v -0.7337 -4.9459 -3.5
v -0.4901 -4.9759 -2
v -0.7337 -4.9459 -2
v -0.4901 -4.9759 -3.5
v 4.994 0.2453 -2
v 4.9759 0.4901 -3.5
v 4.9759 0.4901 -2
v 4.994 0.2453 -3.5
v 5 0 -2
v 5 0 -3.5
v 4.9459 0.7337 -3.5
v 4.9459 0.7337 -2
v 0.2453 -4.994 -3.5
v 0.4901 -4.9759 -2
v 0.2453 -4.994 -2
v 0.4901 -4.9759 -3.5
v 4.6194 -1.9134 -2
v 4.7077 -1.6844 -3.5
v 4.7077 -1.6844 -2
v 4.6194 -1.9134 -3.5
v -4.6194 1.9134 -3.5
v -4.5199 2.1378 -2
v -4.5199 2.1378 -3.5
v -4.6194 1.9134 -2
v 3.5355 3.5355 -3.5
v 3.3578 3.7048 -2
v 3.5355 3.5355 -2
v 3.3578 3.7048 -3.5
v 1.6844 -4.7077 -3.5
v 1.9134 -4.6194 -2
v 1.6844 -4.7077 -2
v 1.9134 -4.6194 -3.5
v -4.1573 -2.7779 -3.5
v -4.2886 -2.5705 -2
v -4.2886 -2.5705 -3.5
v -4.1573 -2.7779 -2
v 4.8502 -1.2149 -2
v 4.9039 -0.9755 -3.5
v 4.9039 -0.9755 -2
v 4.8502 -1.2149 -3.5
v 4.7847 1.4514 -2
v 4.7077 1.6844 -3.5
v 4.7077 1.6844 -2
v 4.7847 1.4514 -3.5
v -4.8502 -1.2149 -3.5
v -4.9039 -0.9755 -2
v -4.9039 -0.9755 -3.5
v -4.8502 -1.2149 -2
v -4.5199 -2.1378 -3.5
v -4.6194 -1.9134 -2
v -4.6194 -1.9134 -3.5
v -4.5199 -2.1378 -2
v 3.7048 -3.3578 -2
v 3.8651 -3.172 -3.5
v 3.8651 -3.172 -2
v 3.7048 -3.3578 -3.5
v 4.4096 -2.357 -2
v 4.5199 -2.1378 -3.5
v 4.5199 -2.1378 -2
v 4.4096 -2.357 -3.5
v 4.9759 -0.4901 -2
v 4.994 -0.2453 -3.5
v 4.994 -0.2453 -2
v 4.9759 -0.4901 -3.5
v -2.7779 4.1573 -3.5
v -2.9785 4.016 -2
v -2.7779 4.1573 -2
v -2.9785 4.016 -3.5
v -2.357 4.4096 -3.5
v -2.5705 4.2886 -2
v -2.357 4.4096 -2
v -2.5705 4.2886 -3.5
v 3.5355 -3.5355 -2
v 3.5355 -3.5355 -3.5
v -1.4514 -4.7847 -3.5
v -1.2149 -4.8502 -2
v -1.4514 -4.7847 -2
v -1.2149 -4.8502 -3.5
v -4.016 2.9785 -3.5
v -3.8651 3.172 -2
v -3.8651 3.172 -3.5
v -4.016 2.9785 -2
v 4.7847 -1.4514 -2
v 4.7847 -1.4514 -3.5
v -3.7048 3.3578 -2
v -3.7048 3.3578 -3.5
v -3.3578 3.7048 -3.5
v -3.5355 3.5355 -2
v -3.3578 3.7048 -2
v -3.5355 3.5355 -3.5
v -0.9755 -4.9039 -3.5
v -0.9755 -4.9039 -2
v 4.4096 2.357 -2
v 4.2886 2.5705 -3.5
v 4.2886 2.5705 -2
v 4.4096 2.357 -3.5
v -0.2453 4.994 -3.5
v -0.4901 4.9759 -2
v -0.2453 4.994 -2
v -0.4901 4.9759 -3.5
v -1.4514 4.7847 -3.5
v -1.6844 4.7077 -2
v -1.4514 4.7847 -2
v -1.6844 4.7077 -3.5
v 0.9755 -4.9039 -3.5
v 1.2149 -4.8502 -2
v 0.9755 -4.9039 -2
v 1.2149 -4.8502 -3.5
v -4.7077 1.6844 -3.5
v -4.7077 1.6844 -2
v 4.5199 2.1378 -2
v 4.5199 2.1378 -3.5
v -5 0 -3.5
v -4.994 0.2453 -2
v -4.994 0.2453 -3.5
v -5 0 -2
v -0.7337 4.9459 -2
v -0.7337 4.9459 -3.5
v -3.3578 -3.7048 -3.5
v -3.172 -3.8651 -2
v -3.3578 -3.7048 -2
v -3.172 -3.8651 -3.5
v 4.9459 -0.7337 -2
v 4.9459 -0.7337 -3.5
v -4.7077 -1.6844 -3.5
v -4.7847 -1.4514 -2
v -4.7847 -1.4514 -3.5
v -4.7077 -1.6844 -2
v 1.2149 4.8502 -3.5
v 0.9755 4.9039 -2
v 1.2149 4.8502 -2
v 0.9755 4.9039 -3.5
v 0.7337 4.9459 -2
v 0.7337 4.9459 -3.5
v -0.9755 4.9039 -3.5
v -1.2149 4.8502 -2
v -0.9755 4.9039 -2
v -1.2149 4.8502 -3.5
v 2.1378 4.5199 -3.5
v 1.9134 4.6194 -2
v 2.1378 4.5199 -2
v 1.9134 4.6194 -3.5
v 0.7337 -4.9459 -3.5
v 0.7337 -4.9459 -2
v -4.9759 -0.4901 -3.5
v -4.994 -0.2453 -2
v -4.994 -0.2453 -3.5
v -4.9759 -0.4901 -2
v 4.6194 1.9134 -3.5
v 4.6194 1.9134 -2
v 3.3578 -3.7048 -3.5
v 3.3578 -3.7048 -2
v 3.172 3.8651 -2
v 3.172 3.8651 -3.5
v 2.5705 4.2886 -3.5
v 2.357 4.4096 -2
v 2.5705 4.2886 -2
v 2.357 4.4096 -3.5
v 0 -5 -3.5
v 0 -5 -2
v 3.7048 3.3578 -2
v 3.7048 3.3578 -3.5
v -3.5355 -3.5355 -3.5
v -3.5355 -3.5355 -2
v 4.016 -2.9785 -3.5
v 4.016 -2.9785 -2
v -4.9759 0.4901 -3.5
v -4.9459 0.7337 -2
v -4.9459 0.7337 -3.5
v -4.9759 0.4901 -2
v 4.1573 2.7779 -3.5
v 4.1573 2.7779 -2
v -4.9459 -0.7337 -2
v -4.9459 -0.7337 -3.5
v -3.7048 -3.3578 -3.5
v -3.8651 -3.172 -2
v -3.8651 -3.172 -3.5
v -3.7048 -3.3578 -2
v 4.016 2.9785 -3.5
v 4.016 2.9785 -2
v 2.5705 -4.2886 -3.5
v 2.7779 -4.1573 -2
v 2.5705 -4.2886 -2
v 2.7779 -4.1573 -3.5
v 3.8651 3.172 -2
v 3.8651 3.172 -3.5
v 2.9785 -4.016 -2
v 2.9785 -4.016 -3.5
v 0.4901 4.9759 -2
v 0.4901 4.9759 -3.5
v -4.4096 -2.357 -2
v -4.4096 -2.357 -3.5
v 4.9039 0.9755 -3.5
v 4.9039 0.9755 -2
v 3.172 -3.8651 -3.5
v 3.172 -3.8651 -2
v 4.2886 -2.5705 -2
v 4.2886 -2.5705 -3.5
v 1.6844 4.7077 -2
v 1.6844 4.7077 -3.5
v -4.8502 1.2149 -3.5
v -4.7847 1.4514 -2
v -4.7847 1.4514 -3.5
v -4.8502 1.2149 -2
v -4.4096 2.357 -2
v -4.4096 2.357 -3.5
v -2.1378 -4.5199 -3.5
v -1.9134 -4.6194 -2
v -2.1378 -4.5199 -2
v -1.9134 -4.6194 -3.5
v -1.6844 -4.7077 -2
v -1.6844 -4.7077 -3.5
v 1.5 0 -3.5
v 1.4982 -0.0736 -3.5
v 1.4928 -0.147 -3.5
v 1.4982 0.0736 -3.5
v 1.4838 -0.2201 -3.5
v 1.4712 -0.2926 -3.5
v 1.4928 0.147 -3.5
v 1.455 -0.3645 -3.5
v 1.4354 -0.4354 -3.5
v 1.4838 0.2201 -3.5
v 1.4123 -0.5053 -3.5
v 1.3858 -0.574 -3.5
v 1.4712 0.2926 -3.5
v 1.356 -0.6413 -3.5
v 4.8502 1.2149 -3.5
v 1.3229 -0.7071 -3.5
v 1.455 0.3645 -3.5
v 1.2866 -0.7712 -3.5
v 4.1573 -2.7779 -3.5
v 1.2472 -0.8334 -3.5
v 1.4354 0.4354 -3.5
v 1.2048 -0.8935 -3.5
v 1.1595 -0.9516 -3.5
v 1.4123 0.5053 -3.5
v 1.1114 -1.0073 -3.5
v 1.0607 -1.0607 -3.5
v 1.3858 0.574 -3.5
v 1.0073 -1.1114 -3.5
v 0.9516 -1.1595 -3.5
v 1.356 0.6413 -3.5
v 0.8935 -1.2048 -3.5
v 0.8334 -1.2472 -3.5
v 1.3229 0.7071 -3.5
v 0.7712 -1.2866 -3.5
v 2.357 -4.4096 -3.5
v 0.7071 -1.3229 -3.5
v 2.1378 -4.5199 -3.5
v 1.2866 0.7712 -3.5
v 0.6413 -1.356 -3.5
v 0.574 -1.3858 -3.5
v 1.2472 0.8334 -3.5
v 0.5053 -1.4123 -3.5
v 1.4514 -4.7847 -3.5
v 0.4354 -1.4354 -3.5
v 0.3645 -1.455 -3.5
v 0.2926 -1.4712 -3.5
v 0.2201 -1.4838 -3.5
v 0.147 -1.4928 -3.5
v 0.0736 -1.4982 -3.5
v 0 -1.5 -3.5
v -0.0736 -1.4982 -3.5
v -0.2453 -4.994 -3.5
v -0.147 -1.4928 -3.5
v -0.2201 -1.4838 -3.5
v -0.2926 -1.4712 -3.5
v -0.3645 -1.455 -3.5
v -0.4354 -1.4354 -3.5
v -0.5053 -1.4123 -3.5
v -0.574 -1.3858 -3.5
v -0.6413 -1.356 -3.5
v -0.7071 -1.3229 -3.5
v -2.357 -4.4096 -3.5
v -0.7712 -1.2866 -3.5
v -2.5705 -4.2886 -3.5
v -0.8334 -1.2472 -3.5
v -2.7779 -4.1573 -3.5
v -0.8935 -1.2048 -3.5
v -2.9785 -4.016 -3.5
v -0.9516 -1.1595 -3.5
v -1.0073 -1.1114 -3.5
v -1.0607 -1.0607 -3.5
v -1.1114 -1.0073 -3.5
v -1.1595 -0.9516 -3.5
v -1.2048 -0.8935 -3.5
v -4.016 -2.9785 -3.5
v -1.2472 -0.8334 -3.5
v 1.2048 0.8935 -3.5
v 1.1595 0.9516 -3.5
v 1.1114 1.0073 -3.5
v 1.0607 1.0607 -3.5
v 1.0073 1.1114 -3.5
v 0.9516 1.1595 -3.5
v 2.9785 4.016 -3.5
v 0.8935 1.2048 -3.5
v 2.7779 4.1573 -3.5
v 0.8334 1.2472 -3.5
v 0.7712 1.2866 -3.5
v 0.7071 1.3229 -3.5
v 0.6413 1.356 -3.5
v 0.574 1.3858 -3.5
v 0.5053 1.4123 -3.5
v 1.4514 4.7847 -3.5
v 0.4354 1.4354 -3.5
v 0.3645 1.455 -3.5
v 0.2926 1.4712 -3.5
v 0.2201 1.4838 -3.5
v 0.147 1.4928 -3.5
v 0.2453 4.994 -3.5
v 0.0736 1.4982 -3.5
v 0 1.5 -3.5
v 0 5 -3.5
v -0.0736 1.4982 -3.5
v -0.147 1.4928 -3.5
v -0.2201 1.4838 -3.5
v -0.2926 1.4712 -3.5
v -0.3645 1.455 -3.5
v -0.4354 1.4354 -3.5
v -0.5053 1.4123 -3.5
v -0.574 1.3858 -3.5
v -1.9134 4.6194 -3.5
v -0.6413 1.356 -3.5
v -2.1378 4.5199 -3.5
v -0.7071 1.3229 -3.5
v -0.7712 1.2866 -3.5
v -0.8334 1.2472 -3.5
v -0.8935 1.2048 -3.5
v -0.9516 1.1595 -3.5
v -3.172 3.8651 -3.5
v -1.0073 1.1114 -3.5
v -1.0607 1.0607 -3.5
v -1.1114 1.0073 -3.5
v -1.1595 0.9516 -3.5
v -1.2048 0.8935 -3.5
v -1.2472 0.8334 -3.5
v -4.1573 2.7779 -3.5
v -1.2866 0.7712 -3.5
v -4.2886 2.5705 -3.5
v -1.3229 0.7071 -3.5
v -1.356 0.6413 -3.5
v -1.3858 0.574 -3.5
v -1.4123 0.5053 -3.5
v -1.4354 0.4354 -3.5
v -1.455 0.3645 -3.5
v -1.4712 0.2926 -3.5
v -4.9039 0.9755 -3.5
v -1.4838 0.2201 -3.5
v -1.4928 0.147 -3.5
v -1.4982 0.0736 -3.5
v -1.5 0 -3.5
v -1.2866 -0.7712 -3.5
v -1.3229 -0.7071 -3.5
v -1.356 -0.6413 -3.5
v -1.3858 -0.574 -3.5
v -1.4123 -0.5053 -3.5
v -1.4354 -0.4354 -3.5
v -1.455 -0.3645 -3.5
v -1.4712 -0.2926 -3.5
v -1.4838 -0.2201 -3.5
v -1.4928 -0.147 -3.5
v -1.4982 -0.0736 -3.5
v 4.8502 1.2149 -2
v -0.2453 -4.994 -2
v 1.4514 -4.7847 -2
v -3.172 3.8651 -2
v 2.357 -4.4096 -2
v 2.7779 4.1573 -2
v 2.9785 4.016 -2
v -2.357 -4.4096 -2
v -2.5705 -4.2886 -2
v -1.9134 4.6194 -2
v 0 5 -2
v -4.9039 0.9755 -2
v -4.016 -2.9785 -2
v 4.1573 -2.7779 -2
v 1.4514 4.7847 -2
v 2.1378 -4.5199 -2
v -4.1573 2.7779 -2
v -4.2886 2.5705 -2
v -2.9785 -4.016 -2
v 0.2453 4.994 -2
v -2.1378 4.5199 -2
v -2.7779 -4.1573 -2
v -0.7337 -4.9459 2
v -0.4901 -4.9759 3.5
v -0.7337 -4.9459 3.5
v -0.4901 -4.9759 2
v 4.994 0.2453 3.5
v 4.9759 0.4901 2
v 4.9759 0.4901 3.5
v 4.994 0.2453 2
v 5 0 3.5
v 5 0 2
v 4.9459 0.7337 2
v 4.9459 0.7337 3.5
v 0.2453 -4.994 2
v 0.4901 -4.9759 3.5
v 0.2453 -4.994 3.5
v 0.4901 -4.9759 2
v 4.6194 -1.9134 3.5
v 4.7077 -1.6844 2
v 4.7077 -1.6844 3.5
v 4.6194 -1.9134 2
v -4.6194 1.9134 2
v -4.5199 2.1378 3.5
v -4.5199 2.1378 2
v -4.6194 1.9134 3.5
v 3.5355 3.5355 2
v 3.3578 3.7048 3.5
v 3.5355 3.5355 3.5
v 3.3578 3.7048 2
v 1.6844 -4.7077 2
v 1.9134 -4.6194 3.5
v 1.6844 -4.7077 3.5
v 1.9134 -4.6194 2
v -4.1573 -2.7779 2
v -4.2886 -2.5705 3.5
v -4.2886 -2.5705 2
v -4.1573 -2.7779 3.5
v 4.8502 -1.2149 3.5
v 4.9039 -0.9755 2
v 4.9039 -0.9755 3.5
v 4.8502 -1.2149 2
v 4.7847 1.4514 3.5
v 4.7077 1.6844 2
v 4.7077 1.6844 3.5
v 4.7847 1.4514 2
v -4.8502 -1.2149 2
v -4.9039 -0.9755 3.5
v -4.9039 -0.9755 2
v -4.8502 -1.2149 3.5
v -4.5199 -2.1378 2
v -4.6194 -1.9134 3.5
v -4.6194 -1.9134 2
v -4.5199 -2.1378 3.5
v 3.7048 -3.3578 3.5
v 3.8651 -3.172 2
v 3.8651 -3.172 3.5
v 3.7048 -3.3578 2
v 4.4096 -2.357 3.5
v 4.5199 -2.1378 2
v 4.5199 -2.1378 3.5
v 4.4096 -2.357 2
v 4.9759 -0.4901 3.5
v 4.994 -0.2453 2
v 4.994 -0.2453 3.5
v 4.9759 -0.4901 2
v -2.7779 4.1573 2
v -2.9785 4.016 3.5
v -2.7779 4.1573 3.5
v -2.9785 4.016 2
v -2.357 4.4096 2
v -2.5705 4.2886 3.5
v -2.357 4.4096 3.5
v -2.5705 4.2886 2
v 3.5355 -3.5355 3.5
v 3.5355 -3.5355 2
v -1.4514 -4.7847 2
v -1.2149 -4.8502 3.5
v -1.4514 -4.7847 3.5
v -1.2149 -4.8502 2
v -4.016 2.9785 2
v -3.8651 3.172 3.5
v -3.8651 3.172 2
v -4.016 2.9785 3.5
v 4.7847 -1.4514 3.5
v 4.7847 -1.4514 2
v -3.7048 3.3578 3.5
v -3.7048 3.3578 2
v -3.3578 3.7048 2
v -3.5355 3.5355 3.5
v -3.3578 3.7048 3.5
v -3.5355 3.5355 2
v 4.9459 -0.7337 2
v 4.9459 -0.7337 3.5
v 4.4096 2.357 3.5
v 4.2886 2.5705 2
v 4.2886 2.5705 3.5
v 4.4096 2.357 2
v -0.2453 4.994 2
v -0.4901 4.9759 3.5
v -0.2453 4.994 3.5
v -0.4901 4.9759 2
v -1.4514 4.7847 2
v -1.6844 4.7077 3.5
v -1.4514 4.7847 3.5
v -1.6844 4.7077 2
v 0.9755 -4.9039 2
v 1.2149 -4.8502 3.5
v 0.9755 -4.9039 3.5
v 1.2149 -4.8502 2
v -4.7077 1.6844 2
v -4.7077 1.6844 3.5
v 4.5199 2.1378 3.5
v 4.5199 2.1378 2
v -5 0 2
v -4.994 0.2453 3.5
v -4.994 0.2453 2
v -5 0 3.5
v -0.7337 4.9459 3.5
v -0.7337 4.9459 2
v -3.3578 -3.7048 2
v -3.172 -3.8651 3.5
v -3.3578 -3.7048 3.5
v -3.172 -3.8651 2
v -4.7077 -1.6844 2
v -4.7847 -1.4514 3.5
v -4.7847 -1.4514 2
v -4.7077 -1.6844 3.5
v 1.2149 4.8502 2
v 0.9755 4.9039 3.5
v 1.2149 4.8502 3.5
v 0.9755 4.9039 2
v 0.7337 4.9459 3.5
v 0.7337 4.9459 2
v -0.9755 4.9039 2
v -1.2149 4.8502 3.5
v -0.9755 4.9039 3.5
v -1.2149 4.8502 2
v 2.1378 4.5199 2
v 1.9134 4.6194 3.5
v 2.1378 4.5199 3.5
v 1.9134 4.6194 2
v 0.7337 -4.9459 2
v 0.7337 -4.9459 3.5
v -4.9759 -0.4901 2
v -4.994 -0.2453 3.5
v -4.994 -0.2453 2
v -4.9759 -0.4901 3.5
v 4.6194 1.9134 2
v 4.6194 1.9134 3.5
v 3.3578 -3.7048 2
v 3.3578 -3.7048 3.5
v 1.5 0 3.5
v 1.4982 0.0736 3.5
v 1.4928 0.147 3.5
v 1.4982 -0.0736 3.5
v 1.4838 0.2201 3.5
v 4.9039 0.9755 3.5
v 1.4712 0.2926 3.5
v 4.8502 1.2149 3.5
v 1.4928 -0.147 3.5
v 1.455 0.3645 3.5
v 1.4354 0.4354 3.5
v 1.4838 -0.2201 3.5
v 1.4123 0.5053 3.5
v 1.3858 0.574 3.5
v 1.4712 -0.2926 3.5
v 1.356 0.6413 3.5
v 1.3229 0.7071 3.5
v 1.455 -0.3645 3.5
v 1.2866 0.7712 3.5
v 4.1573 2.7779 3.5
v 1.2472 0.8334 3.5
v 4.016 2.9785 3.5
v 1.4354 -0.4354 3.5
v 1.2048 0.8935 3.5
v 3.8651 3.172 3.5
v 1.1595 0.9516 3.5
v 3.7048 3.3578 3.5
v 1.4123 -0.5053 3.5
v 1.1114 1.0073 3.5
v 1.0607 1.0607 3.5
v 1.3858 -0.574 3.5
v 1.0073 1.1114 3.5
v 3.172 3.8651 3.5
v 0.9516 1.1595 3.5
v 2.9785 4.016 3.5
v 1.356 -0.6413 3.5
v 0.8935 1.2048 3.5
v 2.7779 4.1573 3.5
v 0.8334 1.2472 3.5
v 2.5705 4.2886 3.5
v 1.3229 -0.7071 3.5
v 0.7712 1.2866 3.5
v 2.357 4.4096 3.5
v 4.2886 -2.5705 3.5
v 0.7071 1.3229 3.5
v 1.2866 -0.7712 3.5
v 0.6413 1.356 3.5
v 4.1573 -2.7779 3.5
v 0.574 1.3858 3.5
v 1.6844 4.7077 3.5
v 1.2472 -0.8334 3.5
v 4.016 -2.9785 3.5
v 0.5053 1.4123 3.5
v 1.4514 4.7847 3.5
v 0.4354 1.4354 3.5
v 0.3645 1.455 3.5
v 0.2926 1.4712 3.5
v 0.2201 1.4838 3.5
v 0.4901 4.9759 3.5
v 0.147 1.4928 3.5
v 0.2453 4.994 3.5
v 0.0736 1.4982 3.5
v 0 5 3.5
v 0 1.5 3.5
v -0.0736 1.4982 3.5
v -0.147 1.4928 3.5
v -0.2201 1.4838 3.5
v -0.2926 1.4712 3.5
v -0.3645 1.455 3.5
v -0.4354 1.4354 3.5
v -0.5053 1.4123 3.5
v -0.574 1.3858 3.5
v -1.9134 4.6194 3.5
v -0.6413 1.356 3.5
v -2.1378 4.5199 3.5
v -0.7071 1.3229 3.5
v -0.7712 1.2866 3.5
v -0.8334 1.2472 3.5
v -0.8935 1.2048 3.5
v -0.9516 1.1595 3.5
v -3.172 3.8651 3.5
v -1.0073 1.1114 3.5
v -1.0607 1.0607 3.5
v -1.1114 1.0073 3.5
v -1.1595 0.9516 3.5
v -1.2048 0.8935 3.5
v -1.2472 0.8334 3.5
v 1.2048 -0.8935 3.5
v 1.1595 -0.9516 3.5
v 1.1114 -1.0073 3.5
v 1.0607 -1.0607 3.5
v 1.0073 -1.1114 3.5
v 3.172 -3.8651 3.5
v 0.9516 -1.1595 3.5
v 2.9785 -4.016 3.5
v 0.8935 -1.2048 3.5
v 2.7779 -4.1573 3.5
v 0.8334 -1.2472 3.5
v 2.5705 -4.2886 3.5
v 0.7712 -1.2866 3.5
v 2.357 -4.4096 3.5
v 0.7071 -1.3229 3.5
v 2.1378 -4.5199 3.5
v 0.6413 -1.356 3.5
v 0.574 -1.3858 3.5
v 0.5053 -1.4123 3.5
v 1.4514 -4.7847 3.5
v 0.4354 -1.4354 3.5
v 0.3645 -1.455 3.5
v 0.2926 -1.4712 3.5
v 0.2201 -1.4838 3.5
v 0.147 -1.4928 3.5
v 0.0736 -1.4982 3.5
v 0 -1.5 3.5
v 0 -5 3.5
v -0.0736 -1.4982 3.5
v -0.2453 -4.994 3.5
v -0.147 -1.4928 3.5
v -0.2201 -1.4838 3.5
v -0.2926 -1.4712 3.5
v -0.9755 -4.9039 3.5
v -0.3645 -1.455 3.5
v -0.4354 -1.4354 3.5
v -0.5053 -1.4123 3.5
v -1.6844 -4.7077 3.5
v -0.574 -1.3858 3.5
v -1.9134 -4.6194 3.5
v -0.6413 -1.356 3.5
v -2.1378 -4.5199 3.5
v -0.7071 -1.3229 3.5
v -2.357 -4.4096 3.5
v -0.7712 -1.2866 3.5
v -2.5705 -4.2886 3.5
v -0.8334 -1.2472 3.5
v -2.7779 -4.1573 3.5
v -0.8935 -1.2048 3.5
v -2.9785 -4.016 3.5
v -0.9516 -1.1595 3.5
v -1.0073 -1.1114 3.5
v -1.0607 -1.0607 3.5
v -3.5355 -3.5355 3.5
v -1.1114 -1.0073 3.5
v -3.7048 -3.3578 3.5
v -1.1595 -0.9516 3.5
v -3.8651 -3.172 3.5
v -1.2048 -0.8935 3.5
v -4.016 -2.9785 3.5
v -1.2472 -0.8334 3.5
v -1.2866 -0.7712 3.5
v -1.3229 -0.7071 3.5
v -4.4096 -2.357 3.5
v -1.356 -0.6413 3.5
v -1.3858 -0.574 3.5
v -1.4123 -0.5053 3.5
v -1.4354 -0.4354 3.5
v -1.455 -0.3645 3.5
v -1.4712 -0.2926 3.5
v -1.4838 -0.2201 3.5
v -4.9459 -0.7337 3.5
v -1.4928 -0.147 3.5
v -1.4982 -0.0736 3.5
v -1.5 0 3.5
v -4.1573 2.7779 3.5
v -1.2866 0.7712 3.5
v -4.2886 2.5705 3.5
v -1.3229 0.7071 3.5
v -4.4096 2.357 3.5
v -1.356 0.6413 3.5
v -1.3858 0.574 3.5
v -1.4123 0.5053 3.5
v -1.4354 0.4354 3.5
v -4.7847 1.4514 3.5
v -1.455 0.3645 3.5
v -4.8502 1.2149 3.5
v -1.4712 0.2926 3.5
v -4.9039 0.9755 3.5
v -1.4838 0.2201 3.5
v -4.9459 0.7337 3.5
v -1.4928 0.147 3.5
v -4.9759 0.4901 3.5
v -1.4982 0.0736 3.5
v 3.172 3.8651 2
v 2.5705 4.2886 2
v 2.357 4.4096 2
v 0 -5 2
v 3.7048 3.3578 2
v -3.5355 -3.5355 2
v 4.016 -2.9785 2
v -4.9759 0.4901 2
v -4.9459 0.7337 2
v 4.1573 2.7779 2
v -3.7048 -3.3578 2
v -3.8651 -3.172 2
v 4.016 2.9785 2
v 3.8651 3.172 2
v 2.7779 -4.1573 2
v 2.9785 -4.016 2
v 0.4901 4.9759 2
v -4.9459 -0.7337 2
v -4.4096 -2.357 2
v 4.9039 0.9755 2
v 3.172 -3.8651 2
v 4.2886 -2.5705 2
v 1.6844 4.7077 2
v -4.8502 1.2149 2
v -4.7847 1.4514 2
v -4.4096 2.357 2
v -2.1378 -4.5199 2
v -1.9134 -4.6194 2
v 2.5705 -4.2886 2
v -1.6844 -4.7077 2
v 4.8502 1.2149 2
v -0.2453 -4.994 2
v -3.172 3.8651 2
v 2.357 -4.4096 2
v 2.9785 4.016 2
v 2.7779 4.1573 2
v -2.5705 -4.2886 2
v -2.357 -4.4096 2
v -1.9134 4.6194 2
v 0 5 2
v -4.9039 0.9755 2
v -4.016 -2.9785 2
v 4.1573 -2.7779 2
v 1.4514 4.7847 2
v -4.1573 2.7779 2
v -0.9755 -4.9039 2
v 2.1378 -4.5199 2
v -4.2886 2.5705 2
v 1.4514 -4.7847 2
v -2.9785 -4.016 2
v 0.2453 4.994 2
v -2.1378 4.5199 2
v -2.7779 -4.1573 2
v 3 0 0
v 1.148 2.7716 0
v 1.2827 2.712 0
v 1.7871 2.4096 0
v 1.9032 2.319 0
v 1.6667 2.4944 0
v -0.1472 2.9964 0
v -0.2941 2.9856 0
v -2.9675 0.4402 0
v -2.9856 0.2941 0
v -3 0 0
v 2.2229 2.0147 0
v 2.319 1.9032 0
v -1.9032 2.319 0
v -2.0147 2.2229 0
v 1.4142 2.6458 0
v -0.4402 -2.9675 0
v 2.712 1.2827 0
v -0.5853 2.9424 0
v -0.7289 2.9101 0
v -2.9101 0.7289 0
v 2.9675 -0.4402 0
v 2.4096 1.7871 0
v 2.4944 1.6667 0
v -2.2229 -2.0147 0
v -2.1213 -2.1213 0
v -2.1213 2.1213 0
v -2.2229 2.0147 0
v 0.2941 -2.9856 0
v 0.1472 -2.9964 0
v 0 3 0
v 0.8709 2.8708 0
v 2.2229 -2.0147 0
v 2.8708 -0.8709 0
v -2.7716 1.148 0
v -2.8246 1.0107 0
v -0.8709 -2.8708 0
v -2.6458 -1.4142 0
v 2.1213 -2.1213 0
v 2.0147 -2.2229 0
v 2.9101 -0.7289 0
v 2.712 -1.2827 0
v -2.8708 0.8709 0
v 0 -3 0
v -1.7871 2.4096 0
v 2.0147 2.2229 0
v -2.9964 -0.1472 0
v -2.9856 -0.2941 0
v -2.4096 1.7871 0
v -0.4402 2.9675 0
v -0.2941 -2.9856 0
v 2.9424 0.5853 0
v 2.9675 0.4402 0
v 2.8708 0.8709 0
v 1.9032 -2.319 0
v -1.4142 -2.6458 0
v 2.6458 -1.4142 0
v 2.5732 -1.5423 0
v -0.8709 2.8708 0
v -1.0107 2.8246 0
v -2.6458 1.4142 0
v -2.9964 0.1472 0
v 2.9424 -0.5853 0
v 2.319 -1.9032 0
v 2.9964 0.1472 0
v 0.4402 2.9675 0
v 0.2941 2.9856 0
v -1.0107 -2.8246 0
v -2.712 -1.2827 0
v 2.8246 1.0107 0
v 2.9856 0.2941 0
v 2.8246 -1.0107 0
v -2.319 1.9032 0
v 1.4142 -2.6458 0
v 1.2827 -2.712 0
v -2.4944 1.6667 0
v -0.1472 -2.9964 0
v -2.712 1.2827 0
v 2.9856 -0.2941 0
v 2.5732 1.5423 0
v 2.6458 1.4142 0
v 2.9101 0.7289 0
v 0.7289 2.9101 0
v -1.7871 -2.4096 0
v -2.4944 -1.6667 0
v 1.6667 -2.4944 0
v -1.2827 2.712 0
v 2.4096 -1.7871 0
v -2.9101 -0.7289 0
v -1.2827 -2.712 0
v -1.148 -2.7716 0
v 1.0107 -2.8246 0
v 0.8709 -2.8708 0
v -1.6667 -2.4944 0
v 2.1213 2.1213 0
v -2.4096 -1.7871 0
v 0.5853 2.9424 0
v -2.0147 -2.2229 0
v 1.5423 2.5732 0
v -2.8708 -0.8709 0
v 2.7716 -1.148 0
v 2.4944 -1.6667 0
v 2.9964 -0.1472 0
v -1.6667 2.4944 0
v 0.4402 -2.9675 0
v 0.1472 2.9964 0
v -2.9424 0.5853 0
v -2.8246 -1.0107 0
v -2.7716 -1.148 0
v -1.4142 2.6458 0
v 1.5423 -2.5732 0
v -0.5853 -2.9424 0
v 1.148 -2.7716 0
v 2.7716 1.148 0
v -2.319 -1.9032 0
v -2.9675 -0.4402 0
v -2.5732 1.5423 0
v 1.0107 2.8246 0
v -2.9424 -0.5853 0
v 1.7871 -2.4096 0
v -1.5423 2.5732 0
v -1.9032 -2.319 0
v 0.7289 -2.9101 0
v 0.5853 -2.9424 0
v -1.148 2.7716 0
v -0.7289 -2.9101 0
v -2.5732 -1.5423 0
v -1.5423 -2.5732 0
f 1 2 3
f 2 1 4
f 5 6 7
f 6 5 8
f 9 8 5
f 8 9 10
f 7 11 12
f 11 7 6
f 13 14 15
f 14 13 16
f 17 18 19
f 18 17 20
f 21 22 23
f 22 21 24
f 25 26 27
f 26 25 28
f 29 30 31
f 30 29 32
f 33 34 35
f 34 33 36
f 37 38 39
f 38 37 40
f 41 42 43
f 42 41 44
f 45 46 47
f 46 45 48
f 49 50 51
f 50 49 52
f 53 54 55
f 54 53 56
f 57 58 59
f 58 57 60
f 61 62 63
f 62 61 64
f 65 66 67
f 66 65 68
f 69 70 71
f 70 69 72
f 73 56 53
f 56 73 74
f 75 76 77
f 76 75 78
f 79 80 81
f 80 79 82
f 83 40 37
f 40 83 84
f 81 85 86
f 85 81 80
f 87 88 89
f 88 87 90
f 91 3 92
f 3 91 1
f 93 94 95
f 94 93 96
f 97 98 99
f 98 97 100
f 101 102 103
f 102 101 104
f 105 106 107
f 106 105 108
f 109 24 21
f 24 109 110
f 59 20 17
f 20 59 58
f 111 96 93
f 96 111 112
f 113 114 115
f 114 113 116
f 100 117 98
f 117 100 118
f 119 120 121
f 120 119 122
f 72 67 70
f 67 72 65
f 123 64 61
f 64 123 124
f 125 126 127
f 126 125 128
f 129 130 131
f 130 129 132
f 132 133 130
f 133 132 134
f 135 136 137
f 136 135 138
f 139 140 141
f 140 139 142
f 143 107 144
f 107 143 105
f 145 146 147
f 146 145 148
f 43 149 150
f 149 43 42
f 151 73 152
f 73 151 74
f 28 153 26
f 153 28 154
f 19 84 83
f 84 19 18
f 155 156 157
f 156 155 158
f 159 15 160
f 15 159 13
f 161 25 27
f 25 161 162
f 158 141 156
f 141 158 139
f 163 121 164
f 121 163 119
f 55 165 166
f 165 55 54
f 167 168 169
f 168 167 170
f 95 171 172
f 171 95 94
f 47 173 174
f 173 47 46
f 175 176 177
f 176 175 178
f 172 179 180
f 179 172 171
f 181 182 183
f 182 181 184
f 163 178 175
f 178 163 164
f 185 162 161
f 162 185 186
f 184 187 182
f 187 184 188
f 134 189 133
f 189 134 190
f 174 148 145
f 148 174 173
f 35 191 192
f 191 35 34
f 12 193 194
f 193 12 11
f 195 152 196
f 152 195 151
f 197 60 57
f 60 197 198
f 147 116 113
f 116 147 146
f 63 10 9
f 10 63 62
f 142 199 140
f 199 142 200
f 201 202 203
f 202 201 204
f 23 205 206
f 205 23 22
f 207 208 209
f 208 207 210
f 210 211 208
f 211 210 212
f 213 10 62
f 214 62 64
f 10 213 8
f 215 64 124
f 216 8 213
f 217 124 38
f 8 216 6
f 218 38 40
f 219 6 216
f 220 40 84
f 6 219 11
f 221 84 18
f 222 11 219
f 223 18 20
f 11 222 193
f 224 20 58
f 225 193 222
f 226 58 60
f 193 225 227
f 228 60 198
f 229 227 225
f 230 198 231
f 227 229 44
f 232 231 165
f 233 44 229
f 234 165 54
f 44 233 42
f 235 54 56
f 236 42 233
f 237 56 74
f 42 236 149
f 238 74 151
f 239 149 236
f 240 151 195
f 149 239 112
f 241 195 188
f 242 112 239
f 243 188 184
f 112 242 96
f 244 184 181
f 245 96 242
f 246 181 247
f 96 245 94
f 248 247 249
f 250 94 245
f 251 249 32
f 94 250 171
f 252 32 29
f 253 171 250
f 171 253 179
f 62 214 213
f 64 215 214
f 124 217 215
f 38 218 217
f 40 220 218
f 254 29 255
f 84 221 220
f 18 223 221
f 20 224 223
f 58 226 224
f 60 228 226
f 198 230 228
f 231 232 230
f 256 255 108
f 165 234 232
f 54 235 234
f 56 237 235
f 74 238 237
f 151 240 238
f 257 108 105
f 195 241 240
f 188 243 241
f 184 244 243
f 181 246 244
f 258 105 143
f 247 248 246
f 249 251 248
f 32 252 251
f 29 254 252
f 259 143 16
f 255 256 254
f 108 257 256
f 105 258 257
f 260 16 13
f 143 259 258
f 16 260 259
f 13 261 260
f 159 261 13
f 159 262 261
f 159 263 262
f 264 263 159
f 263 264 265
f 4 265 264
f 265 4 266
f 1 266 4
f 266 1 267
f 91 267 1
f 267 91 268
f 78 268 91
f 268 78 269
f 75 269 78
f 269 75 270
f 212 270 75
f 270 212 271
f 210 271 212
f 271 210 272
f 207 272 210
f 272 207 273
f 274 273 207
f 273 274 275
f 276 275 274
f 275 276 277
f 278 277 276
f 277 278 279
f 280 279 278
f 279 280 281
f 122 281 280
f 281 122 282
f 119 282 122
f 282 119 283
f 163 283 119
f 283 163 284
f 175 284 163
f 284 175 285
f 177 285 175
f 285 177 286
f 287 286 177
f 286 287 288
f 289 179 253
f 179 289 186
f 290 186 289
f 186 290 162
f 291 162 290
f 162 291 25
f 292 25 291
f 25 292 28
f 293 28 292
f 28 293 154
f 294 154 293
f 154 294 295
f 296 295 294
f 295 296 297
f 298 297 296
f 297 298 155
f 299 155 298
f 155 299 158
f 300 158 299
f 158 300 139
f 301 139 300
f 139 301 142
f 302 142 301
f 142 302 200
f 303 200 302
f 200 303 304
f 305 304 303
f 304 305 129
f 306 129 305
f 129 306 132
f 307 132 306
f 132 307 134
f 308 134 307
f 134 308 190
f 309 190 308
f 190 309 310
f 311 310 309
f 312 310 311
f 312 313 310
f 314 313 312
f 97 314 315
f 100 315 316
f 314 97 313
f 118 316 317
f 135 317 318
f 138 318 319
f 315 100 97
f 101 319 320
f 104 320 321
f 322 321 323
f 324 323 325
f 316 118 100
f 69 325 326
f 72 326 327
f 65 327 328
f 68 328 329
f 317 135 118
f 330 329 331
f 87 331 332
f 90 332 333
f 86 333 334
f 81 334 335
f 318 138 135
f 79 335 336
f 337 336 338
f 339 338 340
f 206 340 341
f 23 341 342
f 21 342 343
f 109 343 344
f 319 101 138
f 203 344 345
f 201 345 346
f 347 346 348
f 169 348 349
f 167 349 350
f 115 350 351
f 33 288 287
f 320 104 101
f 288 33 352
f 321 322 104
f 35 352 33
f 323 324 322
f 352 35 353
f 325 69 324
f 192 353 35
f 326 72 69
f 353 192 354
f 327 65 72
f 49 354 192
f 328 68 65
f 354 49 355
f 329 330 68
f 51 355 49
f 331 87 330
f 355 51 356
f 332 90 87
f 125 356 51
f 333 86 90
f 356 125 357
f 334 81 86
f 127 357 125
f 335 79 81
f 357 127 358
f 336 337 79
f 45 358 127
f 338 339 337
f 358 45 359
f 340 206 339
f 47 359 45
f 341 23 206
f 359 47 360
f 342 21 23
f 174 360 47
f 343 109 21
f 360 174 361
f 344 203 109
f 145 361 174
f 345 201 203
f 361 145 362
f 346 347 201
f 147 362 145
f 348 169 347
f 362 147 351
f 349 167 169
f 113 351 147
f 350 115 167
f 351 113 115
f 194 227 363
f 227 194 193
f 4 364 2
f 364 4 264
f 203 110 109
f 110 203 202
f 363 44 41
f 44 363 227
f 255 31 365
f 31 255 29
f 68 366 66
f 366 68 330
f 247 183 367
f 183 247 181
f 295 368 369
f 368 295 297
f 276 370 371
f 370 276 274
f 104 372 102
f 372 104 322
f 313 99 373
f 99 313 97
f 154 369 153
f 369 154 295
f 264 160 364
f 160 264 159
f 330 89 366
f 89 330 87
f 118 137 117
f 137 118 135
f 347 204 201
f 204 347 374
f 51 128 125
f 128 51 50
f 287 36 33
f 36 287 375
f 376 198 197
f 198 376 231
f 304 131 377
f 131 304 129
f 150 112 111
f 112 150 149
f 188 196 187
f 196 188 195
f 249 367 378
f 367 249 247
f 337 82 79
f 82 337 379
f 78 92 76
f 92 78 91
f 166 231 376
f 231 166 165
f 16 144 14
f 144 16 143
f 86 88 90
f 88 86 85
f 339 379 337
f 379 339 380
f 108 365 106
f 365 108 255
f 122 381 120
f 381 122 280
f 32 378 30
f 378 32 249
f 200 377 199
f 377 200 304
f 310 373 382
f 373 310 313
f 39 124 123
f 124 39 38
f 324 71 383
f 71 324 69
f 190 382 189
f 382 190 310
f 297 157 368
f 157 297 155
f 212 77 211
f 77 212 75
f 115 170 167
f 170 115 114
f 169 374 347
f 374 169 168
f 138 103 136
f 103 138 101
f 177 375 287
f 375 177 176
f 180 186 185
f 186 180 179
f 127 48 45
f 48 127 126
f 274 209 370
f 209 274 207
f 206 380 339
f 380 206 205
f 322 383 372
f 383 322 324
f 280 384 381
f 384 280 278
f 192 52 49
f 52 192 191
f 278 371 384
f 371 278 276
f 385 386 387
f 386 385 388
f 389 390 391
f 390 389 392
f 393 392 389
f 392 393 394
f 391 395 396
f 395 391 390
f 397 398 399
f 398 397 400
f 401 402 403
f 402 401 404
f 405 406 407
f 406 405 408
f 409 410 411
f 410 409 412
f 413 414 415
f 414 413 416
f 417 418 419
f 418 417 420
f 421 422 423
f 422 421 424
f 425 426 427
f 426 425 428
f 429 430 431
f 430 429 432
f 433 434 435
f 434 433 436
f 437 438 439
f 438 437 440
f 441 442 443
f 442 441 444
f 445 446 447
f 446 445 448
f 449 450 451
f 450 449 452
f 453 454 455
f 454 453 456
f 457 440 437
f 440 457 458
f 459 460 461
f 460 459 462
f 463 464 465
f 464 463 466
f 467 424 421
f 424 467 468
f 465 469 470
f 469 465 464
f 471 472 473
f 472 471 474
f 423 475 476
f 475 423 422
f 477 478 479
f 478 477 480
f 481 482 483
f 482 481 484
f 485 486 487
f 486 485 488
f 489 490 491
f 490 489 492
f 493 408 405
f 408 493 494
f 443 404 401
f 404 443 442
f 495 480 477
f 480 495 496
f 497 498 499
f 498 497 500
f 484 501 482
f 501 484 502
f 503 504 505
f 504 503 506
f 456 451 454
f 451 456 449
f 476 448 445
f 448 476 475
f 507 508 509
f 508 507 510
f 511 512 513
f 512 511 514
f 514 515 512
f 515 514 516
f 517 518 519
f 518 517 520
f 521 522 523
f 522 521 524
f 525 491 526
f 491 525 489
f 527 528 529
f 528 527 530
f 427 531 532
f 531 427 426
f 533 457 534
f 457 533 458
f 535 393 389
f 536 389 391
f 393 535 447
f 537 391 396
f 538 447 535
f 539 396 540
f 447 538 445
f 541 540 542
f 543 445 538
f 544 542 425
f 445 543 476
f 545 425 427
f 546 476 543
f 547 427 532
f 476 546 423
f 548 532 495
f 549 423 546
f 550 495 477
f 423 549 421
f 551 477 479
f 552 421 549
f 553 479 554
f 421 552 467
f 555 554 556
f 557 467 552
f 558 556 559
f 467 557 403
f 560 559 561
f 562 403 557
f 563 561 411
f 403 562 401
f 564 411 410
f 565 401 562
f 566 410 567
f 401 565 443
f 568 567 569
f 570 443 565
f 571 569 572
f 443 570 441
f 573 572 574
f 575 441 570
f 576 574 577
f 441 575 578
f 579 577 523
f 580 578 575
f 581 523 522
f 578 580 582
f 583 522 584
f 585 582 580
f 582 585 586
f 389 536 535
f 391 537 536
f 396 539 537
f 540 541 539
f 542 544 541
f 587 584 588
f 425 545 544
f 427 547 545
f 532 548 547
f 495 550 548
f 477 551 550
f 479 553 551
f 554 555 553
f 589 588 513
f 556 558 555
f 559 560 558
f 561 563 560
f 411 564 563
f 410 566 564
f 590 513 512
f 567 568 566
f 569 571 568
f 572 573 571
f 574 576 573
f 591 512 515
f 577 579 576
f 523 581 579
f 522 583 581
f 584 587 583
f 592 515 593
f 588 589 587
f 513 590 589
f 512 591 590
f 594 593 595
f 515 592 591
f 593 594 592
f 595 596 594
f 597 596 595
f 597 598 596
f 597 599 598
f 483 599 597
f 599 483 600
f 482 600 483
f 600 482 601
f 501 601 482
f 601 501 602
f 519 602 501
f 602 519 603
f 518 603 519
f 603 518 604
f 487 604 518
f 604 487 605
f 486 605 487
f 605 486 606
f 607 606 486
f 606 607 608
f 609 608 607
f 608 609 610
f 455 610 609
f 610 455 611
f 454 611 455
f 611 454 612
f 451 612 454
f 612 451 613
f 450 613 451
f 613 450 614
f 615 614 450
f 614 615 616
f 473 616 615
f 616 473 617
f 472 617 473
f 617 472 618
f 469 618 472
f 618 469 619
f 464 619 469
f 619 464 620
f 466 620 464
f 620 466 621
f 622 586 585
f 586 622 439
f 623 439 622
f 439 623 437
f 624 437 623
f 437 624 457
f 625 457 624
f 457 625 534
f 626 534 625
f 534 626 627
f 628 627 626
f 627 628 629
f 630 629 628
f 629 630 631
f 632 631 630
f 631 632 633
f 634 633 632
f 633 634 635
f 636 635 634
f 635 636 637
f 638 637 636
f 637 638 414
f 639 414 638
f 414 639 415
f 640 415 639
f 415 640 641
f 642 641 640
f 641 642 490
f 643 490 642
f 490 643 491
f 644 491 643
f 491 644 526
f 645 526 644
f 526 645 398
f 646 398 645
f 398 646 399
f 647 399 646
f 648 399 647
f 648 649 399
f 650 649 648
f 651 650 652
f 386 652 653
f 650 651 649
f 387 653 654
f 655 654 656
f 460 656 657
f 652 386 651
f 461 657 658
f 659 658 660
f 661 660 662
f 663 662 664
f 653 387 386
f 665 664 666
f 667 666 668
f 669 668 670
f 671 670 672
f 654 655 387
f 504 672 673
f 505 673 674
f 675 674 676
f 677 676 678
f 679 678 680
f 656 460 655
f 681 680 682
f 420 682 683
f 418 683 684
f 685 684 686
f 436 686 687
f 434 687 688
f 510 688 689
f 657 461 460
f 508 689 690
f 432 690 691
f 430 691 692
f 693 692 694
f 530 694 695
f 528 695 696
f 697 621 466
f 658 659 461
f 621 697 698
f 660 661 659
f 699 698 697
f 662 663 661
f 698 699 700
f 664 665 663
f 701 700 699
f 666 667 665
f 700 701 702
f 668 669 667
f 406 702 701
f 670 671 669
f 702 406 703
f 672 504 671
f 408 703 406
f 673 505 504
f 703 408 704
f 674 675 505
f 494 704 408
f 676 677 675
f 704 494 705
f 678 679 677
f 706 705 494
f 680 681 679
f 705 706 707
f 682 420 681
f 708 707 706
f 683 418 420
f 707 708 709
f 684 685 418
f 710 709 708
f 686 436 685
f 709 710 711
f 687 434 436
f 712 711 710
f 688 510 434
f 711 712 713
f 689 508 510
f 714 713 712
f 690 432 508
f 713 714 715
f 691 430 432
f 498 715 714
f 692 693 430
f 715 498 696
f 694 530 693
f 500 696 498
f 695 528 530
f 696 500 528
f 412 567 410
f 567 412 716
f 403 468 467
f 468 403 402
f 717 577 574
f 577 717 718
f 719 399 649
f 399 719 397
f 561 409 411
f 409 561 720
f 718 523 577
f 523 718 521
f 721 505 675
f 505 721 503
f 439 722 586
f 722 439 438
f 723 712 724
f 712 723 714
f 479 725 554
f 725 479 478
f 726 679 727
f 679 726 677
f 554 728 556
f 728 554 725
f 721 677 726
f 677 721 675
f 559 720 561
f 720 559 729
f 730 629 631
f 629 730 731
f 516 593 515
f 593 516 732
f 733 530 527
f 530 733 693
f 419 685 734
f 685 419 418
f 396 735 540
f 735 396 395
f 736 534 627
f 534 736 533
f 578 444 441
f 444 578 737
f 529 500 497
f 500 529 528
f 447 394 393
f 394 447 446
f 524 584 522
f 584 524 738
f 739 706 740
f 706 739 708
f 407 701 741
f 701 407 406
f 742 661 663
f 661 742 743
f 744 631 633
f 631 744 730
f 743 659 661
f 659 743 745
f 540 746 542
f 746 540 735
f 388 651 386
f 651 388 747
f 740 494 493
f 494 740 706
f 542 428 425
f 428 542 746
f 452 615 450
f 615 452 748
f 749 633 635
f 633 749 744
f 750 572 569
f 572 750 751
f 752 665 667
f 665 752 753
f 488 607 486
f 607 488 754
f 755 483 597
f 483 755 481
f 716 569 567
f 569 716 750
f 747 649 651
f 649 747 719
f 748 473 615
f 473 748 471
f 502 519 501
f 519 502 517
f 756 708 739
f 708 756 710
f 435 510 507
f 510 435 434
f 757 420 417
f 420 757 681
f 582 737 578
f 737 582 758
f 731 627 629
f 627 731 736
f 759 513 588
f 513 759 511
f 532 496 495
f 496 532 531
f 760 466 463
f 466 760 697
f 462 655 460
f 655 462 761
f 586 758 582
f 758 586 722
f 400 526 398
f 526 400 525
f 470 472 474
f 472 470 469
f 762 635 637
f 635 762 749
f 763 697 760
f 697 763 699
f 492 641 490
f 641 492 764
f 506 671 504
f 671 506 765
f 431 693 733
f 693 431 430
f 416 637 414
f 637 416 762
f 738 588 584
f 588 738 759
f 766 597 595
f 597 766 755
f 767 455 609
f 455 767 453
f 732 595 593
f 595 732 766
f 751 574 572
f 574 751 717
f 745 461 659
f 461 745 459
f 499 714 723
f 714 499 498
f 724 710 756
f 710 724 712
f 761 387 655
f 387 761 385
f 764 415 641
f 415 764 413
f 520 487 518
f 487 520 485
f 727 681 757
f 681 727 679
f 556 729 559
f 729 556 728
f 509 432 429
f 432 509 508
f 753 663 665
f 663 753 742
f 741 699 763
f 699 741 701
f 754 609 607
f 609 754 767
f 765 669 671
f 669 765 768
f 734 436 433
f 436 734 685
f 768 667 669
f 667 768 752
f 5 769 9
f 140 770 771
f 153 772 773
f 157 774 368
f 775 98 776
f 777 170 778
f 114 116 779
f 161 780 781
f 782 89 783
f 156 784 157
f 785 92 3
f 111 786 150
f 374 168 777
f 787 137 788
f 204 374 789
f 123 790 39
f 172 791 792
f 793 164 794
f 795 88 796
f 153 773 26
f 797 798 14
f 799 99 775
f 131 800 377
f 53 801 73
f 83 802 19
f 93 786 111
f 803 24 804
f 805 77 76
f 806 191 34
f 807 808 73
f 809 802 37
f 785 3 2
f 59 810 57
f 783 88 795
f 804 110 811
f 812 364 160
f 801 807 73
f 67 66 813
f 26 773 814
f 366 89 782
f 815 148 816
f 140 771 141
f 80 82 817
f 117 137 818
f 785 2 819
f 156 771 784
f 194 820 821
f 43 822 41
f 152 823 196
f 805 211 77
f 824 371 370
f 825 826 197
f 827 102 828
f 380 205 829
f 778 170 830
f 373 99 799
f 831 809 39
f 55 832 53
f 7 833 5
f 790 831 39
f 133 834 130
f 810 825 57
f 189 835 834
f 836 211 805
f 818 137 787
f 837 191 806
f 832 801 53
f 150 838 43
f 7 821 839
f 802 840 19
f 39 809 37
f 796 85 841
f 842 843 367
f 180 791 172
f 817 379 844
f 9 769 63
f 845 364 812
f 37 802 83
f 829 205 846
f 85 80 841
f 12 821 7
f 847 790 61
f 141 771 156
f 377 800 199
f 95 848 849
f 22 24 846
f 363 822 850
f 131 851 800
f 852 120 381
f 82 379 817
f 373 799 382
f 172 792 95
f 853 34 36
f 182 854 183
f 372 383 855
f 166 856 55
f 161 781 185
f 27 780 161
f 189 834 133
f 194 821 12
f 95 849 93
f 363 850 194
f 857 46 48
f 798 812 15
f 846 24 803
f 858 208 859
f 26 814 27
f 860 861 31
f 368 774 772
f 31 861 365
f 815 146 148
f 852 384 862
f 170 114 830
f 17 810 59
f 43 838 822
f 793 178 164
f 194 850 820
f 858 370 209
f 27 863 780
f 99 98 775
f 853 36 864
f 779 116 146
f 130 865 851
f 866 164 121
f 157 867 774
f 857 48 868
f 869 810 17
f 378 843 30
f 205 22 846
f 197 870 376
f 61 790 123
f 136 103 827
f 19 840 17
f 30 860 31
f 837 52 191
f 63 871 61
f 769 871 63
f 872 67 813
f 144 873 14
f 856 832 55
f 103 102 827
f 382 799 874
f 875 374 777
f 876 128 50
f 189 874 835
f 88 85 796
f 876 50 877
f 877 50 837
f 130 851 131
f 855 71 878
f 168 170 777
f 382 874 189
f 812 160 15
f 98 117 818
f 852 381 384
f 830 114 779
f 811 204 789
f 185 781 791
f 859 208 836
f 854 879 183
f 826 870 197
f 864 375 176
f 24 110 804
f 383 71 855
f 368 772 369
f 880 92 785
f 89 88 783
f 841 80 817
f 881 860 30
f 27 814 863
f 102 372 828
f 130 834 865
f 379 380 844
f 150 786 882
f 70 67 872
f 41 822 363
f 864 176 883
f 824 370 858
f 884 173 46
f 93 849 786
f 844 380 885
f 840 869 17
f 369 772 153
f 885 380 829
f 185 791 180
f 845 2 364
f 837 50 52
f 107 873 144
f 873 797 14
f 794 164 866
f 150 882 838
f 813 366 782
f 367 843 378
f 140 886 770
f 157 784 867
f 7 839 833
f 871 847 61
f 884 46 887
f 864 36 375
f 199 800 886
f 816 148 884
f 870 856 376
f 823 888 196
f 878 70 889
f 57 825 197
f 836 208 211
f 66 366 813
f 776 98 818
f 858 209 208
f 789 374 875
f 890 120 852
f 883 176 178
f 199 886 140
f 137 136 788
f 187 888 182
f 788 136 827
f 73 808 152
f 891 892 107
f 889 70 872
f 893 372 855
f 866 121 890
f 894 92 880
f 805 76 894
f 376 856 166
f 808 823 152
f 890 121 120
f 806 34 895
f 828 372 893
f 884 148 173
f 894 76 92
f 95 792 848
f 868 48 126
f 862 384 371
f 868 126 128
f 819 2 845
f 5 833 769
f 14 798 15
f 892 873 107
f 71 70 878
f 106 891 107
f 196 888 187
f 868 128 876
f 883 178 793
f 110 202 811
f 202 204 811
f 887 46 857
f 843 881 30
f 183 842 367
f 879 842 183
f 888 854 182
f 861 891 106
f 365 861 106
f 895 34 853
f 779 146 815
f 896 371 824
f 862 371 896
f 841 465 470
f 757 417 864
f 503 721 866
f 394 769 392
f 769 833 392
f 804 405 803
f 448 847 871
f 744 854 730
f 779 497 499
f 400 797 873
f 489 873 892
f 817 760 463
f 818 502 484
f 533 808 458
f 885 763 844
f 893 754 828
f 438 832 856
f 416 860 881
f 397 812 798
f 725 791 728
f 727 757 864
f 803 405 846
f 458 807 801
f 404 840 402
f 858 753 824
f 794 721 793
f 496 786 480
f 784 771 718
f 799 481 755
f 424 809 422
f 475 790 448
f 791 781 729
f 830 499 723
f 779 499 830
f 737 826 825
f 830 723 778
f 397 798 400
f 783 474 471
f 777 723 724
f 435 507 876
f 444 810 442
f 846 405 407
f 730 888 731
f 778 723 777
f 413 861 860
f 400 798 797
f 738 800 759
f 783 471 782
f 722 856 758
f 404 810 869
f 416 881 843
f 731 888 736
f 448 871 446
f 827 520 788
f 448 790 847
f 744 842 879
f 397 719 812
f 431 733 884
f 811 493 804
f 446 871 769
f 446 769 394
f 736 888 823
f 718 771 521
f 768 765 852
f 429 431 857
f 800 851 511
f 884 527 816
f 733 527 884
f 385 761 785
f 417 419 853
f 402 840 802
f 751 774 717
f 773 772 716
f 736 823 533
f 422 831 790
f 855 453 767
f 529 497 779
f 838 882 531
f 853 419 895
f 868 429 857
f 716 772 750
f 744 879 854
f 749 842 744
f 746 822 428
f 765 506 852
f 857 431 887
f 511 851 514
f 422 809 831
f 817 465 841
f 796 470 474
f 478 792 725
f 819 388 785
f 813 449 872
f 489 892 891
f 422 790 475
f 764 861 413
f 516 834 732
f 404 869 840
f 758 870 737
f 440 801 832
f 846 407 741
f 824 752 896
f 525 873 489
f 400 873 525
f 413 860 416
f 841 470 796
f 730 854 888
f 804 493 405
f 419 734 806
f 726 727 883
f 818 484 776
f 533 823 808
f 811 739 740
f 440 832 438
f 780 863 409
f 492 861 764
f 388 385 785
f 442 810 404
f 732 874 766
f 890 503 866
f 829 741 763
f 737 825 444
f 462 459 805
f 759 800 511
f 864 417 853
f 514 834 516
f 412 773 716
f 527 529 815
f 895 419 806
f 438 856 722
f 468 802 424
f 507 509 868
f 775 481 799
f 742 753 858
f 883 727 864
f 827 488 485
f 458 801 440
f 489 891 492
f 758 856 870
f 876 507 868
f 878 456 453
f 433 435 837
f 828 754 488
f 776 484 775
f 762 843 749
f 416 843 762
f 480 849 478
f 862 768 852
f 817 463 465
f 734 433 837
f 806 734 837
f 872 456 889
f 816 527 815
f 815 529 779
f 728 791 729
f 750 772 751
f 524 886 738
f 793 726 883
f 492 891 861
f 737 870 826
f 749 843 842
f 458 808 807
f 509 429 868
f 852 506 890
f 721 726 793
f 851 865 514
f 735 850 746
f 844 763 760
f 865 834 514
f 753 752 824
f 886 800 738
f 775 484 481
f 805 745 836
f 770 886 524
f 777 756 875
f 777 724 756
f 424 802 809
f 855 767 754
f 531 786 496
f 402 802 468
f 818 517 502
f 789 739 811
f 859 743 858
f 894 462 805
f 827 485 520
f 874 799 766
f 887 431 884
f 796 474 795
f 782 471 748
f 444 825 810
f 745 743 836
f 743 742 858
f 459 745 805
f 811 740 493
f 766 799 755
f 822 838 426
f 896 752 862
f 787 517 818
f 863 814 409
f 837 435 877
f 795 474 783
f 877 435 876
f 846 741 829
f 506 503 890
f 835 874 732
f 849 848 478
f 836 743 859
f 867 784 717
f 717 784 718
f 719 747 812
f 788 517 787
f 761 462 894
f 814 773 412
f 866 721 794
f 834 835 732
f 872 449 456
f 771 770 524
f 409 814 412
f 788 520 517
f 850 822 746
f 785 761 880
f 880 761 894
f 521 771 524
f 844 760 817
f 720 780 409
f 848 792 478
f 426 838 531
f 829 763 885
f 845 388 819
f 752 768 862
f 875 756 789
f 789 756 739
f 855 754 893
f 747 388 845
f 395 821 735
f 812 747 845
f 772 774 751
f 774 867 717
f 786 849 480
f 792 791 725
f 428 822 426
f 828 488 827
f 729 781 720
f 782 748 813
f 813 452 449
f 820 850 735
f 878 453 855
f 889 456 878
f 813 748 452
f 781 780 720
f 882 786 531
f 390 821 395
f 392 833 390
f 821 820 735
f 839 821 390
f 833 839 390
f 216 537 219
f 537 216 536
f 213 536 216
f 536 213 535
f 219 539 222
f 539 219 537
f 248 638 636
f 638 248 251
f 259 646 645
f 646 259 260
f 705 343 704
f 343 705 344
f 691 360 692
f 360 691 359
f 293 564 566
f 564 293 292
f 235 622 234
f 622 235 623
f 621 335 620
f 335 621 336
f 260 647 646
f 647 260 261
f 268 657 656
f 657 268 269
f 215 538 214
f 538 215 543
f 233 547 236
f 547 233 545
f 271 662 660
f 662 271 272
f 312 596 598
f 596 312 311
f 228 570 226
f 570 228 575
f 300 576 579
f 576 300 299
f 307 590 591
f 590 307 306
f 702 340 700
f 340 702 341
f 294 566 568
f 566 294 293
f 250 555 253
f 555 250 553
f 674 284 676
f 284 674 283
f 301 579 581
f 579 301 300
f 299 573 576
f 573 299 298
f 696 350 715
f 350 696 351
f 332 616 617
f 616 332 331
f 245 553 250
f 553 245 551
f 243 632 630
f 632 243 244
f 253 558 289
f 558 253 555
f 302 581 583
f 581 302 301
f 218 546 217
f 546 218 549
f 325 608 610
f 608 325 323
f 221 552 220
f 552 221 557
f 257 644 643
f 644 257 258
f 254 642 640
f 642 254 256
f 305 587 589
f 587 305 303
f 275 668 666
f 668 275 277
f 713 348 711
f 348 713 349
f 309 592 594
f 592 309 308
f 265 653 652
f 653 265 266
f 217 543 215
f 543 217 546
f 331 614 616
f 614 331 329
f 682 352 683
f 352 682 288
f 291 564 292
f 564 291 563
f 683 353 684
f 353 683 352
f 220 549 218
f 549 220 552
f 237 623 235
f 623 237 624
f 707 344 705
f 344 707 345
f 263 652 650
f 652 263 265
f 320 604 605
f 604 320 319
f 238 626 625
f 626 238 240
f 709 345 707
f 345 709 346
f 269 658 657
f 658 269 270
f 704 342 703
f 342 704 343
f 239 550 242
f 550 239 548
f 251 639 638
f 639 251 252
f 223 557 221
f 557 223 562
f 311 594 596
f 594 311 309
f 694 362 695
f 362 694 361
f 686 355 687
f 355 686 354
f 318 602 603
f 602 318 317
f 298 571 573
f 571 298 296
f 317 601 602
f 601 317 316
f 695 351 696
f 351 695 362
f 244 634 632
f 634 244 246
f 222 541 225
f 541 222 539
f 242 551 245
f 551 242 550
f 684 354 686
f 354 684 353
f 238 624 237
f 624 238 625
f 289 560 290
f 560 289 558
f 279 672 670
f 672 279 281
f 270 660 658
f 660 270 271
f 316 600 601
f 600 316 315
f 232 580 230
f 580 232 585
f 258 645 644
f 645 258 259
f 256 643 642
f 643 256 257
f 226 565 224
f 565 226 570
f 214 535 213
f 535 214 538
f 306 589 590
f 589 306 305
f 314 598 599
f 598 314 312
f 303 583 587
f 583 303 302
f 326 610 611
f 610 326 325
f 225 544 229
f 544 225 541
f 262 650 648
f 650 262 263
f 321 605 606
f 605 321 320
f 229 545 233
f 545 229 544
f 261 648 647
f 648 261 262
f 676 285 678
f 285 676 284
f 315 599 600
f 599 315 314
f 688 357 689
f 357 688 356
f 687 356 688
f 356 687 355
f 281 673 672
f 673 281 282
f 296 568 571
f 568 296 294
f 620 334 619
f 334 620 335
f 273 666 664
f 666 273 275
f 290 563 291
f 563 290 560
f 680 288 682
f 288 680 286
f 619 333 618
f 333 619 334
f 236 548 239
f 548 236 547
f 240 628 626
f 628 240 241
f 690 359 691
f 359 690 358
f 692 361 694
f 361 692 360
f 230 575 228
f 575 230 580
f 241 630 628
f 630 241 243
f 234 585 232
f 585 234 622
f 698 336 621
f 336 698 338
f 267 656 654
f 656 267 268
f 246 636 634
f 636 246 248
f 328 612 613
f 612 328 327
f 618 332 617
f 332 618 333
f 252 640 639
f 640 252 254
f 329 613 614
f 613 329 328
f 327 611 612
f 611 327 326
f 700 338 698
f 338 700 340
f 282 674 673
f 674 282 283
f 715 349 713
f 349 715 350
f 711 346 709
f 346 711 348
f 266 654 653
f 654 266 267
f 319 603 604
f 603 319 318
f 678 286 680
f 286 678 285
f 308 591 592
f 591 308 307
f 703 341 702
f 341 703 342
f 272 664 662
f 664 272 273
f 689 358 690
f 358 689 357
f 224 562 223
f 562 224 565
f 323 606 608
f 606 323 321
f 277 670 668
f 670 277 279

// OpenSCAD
$fn=128;

module spool_like_part(od=10, h=7, flange_t=1.5, waist_od=6, bore_d=3) {
    difference() {
        union() {
            cylinder(d=od, h=flange_t, center=false);
            translate([0,0,h-flange_t]) cylinder(d=od, h=flange_t, center=false);

            translate([0,0,flange_t])
                cylinder(h=(h-2*flange_t)/2, d1=od, d2=waist_od, center=false);

            translate([0,0,h/2])
                cylinder(h=(h-2*flange_t)/2, d1=waist_od, d2=od, center=false);
        }
        translate([0,0,-0.1]) cylinder(d=bore_d, h=h+0.2, center=false);
    }
}

translate([0,0,-7/2]) spool_like_part(od=10, h=7, flange_t=1.5, waist_od=6, bore_d=3);
